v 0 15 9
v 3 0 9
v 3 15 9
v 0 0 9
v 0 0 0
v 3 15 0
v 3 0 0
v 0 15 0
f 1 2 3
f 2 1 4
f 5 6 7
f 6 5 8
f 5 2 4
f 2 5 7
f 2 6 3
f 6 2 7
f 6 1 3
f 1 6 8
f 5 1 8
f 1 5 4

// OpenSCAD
// Generated by SolidPython 1.0.1 on 2020-07-29 00:46:54


cube(size = [3, 15, 9]);
/***********************************************
*********      SolidPython code:      **********
************************************************
 
# import packages: SolidPython
from solid import *
from solid.utils import *
from itertools import chain, combinations, permutations


class Resize:

    def __init__(self, scad_file):
        self.scad_file = scad_file
        #self.scad_file = import_scad(scad_file)
        # cone/cylinder param:
        self.r1 = 0
        self.r2 = 0
        self.h = 0
        # rectangular prism param:
        self.w = 0
        self.l = 0
        # ellipse param:
        self.r = 0

    # import OpenScad code (file name corresponds to shape)


    # classify shape + parameters
    def assign(self, param1, param2, param3):
        if self.scad_file == 'cone.scad':
            self.r1 = param1
            self.r2 = param2
            self.h = param3
        elif self.scad_file == 'cylinder.scad':
            self.r1 = param1
            self.r2 = param2
            self.h = param3
        elif self.scad_file == 'rectangularPrism.scad':
            self.h = param1
            self.l = param2
            self.w = param3
        else:
            self.r = param1
            self.h = param2

    # resize parameters
    def iterate(self):
        x = range(3, 20, 2)
        i = 1
        if self.scad_file == 'cone.scad':
            tempList = list(permutations(x, 2))
            for temp in tempList:
                param1 = temp[0]
                param2 = temp[1]
                filepath = 'produced_scad_files/' + 'cone' + str(param1) + '_' + str(param2) + '_' + '.scad'
                scad_render_to_file(cylinder(h=param1, r1=param2, r2=0), filepath)

        elif self.scad_file == 'cylinder.scad':
            tempList = list(permutations(x, 3))
            for temp in tempList:
                param1 = temp[0]
                param2 = temp[1]
                filepath = 'produced_scad_files/' + 'cylinder' + str(param1) + '_' + str(param2) + '_' + '.scad'
                scad_render_to_file(cylinder(h=param1, r1=param2, r2=param2), filepath)

        elif self.scad_file == 'rectangularPrism.scad':
            tempList = list(permutations(x, 3))
            for temp in tempList:
                param1 = temp[0]
                param2 = temp[1]
                param3 = temp[2]
                filepath = 'produced_scad_files/' + 'rectangularPrism' + str(param1) + '_' + str(param2) + '_' + str(
                    param3) + '.scad'
                scad_render_to_file(cube(size=(param1, param2, param3)), filepath)

        elif self.scad_file == 'ellipse.scad':
            tempList = list(permutations(x, 4))
            for temp in tempList:
                param1 = temp[0]
                param2 = temp[1]
                param3 = temp[2]
                param4 = temp[3]
                filepath = 'produced_scad_files/' + 'ellipse' + str(param1) + '_' + str(param2) + '_' + str(param3) + '_' + str(param4) + '.scad'
                scad_render_to_file(scale([param1, param2, param3])(sphere(r=param4)), filepath)

    def render_to_scadfile(self):
        scad_render_to_file(scad, 'example.scad') 
 
************************************************/
